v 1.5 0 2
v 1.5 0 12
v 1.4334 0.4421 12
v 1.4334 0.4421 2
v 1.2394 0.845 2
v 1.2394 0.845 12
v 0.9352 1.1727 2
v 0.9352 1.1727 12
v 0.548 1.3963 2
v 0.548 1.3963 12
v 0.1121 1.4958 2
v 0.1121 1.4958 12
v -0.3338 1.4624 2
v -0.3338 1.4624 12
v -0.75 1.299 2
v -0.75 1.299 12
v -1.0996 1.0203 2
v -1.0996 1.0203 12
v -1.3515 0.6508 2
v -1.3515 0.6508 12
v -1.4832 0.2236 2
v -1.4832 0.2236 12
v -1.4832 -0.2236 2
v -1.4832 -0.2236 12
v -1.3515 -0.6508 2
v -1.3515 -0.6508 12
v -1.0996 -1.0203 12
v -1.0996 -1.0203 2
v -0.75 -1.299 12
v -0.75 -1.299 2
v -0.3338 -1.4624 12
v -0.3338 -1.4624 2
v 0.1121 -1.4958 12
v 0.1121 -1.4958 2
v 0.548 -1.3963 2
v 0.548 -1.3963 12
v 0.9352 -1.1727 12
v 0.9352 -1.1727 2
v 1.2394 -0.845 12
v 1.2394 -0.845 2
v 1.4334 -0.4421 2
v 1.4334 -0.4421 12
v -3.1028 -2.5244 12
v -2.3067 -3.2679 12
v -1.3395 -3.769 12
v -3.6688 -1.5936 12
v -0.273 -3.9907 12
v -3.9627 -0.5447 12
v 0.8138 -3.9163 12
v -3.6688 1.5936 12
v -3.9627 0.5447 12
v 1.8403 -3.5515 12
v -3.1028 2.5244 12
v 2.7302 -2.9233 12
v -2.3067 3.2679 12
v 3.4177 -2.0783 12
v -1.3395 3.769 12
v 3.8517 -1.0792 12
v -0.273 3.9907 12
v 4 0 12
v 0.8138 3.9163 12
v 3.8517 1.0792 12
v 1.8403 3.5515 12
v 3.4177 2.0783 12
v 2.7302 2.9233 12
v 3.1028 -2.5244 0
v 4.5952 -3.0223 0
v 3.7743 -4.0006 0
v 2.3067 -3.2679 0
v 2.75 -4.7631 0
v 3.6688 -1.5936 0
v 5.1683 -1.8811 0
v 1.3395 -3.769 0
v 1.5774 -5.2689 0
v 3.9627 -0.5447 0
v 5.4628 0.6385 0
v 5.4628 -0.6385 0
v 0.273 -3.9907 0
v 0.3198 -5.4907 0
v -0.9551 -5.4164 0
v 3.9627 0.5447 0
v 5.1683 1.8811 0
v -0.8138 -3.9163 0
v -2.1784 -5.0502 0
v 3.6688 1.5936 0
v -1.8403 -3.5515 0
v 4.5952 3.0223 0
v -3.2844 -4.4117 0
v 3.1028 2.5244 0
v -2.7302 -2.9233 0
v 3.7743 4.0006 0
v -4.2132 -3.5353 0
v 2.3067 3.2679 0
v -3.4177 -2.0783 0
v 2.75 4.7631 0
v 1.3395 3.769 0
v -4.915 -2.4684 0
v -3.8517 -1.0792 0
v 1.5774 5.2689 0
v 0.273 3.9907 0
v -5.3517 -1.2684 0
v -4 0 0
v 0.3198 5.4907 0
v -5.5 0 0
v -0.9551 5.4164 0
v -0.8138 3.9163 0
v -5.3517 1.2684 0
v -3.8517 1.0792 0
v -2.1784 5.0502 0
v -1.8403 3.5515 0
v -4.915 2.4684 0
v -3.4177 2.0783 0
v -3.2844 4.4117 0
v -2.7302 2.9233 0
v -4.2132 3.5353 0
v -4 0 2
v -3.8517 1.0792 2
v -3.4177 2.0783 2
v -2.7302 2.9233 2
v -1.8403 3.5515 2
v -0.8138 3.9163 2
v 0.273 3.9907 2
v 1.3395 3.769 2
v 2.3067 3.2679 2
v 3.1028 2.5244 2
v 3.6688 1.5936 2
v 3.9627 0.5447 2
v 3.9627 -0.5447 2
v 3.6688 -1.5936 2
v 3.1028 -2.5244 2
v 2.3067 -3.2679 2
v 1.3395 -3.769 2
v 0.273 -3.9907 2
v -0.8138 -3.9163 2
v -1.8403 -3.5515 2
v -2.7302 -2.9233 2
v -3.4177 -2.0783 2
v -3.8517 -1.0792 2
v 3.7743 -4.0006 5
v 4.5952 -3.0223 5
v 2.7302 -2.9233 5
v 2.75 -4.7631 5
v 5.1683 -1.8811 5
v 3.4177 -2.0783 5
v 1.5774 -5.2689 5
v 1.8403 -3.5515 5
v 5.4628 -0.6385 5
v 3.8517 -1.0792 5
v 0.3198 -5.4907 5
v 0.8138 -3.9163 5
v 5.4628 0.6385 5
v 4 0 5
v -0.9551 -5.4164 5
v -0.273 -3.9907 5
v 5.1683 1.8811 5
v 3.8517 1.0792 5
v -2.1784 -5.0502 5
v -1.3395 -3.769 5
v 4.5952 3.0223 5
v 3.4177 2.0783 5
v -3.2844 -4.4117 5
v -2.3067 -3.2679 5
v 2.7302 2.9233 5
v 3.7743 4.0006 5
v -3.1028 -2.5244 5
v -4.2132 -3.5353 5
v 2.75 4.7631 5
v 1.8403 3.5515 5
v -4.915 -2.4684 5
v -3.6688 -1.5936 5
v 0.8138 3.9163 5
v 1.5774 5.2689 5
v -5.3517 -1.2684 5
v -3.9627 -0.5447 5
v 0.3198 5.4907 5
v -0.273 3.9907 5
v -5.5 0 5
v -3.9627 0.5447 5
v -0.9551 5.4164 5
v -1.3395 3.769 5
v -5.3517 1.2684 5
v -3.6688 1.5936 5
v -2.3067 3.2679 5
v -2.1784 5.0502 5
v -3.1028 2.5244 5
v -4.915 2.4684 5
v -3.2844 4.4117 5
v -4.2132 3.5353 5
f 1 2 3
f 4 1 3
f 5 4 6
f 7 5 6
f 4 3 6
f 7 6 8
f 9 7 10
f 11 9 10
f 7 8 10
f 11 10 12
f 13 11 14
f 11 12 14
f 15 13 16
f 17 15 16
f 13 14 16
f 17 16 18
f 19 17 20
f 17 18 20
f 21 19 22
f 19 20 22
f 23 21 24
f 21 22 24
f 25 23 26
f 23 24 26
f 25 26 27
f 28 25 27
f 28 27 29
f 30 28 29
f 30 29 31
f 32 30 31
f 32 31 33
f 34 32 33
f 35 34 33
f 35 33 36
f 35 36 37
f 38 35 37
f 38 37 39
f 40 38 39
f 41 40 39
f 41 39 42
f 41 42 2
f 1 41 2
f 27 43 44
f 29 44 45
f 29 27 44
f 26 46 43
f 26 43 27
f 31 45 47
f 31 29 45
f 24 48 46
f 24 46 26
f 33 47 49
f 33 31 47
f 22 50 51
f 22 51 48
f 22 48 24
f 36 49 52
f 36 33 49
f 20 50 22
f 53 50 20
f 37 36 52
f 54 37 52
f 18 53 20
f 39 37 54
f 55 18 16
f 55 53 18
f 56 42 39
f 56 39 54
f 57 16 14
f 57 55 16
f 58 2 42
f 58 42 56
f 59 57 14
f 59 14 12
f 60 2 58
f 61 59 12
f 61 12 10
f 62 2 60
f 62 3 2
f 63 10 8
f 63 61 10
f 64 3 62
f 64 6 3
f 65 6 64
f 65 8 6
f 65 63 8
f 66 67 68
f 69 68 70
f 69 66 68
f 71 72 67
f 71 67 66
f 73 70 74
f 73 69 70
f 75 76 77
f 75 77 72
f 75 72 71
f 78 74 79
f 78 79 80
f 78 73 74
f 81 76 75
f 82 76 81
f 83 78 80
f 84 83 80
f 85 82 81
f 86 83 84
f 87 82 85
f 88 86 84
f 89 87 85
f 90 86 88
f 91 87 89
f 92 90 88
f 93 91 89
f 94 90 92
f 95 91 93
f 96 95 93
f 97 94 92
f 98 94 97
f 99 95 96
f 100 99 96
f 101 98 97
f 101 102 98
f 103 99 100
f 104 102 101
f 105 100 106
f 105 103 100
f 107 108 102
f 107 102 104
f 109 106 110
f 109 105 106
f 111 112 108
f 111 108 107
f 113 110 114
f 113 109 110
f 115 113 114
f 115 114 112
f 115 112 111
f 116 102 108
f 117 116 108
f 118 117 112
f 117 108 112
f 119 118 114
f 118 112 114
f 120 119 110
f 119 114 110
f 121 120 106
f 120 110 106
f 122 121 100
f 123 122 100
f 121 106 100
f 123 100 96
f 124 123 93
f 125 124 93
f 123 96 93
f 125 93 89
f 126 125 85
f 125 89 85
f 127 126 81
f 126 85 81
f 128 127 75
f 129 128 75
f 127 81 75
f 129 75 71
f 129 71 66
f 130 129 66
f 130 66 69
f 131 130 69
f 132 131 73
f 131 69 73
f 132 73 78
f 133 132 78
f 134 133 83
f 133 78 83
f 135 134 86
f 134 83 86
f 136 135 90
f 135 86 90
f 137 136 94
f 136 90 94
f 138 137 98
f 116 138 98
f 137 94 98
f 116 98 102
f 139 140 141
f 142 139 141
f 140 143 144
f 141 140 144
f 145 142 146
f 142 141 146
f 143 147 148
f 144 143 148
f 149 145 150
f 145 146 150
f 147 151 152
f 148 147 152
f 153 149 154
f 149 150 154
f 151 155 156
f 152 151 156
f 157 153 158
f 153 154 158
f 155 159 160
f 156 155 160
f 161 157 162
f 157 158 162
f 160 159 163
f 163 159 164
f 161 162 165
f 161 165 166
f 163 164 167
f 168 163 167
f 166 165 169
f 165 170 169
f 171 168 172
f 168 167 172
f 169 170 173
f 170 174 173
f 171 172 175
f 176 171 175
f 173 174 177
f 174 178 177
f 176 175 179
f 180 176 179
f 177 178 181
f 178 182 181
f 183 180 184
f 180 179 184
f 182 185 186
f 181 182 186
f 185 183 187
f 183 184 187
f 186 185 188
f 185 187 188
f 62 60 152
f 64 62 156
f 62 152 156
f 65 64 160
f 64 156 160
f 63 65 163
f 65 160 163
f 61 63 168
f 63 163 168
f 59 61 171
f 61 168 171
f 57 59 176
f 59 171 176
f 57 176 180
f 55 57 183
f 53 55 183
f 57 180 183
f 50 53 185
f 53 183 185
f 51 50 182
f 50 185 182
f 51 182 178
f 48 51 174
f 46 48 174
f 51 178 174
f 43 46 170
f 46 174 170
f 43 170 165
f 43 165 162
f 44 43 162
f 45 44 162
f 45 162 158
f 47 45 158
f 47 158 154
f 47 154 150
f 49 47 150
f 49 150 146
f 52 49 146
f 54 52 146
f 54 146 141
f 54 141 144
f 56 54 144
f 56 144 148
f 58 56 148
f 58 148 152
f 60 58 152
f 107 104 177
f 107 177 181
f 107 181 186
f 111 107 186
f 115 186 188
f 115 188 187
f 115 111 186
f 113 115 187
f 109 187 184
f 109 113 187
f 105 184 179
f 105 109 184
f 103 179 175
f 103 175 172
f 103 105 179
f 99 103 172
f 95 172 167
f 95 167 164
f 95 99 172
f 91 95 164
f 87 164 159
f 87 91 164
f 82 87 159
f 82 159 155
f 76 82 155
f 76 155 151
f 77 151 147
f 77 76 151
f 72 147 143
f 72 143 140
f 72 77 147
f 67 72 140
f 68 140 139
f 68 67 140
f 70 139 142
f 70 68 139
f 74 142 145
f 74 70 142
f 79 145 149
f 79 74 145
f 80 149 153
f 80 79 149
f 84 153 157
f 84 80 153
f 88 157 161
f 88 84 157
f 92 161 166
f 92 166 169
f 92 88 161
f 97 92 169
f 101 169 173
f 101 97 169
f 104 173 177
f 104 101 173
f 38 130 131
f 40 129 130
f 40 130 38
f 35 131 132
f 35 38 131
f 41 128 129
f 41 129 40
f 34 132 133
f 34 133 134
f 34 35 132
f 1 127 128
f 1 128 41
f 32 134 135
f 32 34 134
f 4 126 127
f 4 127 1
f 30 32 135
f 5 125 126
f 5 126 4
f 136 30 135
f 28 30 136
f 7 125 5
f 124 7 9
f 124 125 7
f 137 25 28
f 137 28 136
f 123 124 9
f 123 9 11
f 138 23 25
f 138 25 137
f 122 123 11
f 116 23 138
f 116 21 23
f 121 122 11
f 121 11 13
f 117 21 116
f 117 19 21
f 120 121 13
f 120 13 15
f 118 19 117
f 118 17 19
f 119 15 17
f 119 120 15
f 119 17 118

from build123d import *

# Parameters (mm, degrees)
SKETCH_1_R          = 4
EXTRUDE_1_DEPTH     = 12
SKETCH_2_R          = 5.5
EXTRUDE_2_DEPTH     = 5
SKETCH_3_R          = 4
CUT_EXTRUDE_5_DEPTH = 2
SKETCH_5_R          = 1.5
CUT_EXTRUDE_6_DEPTH = 15.300349646


with BuildPart() as part:
    # 草图1 → 拉伸1 (new body)
    with BuildSketch(Plane.XY):
        Circle(SKETCH_1_R)
    extrude(amount=EXTRUDE_1_DEPTH)

    # 草图2 → 拉伸2 (add)
    with BuildSketch(Plane(origin=(0, 0, 0), x_dir=(-1, 0, 0), z_dir=(0, 0, -1))):
        Circle(SKETCH_2_R)
    extrude(amount=-EXTRUDE_2_DEPTH)

    # 草图3 → 拉伸5 (cut)
    with BuildSketch(Plane(origin=(0, 0, 0), x_dir=(-1, 0, 0), z_dir=(0, 0, -1))):
        Circle(SKETCH_3_R)
    extrude(amount=-CUT_EXTRUDE_5_DEPTH, mode=Mode.SUBTRACT)

    # 草图5 → 拉伸6 (cut, through all)
    with BuildSketch(Plane.XY.offset(12)):
        Circle(SKETCH_5_R)
    extrude(amount=-CUT_EXTRUDE_6_DEPTH, mode=Mode.SUBTRACT)


solid = part.part
